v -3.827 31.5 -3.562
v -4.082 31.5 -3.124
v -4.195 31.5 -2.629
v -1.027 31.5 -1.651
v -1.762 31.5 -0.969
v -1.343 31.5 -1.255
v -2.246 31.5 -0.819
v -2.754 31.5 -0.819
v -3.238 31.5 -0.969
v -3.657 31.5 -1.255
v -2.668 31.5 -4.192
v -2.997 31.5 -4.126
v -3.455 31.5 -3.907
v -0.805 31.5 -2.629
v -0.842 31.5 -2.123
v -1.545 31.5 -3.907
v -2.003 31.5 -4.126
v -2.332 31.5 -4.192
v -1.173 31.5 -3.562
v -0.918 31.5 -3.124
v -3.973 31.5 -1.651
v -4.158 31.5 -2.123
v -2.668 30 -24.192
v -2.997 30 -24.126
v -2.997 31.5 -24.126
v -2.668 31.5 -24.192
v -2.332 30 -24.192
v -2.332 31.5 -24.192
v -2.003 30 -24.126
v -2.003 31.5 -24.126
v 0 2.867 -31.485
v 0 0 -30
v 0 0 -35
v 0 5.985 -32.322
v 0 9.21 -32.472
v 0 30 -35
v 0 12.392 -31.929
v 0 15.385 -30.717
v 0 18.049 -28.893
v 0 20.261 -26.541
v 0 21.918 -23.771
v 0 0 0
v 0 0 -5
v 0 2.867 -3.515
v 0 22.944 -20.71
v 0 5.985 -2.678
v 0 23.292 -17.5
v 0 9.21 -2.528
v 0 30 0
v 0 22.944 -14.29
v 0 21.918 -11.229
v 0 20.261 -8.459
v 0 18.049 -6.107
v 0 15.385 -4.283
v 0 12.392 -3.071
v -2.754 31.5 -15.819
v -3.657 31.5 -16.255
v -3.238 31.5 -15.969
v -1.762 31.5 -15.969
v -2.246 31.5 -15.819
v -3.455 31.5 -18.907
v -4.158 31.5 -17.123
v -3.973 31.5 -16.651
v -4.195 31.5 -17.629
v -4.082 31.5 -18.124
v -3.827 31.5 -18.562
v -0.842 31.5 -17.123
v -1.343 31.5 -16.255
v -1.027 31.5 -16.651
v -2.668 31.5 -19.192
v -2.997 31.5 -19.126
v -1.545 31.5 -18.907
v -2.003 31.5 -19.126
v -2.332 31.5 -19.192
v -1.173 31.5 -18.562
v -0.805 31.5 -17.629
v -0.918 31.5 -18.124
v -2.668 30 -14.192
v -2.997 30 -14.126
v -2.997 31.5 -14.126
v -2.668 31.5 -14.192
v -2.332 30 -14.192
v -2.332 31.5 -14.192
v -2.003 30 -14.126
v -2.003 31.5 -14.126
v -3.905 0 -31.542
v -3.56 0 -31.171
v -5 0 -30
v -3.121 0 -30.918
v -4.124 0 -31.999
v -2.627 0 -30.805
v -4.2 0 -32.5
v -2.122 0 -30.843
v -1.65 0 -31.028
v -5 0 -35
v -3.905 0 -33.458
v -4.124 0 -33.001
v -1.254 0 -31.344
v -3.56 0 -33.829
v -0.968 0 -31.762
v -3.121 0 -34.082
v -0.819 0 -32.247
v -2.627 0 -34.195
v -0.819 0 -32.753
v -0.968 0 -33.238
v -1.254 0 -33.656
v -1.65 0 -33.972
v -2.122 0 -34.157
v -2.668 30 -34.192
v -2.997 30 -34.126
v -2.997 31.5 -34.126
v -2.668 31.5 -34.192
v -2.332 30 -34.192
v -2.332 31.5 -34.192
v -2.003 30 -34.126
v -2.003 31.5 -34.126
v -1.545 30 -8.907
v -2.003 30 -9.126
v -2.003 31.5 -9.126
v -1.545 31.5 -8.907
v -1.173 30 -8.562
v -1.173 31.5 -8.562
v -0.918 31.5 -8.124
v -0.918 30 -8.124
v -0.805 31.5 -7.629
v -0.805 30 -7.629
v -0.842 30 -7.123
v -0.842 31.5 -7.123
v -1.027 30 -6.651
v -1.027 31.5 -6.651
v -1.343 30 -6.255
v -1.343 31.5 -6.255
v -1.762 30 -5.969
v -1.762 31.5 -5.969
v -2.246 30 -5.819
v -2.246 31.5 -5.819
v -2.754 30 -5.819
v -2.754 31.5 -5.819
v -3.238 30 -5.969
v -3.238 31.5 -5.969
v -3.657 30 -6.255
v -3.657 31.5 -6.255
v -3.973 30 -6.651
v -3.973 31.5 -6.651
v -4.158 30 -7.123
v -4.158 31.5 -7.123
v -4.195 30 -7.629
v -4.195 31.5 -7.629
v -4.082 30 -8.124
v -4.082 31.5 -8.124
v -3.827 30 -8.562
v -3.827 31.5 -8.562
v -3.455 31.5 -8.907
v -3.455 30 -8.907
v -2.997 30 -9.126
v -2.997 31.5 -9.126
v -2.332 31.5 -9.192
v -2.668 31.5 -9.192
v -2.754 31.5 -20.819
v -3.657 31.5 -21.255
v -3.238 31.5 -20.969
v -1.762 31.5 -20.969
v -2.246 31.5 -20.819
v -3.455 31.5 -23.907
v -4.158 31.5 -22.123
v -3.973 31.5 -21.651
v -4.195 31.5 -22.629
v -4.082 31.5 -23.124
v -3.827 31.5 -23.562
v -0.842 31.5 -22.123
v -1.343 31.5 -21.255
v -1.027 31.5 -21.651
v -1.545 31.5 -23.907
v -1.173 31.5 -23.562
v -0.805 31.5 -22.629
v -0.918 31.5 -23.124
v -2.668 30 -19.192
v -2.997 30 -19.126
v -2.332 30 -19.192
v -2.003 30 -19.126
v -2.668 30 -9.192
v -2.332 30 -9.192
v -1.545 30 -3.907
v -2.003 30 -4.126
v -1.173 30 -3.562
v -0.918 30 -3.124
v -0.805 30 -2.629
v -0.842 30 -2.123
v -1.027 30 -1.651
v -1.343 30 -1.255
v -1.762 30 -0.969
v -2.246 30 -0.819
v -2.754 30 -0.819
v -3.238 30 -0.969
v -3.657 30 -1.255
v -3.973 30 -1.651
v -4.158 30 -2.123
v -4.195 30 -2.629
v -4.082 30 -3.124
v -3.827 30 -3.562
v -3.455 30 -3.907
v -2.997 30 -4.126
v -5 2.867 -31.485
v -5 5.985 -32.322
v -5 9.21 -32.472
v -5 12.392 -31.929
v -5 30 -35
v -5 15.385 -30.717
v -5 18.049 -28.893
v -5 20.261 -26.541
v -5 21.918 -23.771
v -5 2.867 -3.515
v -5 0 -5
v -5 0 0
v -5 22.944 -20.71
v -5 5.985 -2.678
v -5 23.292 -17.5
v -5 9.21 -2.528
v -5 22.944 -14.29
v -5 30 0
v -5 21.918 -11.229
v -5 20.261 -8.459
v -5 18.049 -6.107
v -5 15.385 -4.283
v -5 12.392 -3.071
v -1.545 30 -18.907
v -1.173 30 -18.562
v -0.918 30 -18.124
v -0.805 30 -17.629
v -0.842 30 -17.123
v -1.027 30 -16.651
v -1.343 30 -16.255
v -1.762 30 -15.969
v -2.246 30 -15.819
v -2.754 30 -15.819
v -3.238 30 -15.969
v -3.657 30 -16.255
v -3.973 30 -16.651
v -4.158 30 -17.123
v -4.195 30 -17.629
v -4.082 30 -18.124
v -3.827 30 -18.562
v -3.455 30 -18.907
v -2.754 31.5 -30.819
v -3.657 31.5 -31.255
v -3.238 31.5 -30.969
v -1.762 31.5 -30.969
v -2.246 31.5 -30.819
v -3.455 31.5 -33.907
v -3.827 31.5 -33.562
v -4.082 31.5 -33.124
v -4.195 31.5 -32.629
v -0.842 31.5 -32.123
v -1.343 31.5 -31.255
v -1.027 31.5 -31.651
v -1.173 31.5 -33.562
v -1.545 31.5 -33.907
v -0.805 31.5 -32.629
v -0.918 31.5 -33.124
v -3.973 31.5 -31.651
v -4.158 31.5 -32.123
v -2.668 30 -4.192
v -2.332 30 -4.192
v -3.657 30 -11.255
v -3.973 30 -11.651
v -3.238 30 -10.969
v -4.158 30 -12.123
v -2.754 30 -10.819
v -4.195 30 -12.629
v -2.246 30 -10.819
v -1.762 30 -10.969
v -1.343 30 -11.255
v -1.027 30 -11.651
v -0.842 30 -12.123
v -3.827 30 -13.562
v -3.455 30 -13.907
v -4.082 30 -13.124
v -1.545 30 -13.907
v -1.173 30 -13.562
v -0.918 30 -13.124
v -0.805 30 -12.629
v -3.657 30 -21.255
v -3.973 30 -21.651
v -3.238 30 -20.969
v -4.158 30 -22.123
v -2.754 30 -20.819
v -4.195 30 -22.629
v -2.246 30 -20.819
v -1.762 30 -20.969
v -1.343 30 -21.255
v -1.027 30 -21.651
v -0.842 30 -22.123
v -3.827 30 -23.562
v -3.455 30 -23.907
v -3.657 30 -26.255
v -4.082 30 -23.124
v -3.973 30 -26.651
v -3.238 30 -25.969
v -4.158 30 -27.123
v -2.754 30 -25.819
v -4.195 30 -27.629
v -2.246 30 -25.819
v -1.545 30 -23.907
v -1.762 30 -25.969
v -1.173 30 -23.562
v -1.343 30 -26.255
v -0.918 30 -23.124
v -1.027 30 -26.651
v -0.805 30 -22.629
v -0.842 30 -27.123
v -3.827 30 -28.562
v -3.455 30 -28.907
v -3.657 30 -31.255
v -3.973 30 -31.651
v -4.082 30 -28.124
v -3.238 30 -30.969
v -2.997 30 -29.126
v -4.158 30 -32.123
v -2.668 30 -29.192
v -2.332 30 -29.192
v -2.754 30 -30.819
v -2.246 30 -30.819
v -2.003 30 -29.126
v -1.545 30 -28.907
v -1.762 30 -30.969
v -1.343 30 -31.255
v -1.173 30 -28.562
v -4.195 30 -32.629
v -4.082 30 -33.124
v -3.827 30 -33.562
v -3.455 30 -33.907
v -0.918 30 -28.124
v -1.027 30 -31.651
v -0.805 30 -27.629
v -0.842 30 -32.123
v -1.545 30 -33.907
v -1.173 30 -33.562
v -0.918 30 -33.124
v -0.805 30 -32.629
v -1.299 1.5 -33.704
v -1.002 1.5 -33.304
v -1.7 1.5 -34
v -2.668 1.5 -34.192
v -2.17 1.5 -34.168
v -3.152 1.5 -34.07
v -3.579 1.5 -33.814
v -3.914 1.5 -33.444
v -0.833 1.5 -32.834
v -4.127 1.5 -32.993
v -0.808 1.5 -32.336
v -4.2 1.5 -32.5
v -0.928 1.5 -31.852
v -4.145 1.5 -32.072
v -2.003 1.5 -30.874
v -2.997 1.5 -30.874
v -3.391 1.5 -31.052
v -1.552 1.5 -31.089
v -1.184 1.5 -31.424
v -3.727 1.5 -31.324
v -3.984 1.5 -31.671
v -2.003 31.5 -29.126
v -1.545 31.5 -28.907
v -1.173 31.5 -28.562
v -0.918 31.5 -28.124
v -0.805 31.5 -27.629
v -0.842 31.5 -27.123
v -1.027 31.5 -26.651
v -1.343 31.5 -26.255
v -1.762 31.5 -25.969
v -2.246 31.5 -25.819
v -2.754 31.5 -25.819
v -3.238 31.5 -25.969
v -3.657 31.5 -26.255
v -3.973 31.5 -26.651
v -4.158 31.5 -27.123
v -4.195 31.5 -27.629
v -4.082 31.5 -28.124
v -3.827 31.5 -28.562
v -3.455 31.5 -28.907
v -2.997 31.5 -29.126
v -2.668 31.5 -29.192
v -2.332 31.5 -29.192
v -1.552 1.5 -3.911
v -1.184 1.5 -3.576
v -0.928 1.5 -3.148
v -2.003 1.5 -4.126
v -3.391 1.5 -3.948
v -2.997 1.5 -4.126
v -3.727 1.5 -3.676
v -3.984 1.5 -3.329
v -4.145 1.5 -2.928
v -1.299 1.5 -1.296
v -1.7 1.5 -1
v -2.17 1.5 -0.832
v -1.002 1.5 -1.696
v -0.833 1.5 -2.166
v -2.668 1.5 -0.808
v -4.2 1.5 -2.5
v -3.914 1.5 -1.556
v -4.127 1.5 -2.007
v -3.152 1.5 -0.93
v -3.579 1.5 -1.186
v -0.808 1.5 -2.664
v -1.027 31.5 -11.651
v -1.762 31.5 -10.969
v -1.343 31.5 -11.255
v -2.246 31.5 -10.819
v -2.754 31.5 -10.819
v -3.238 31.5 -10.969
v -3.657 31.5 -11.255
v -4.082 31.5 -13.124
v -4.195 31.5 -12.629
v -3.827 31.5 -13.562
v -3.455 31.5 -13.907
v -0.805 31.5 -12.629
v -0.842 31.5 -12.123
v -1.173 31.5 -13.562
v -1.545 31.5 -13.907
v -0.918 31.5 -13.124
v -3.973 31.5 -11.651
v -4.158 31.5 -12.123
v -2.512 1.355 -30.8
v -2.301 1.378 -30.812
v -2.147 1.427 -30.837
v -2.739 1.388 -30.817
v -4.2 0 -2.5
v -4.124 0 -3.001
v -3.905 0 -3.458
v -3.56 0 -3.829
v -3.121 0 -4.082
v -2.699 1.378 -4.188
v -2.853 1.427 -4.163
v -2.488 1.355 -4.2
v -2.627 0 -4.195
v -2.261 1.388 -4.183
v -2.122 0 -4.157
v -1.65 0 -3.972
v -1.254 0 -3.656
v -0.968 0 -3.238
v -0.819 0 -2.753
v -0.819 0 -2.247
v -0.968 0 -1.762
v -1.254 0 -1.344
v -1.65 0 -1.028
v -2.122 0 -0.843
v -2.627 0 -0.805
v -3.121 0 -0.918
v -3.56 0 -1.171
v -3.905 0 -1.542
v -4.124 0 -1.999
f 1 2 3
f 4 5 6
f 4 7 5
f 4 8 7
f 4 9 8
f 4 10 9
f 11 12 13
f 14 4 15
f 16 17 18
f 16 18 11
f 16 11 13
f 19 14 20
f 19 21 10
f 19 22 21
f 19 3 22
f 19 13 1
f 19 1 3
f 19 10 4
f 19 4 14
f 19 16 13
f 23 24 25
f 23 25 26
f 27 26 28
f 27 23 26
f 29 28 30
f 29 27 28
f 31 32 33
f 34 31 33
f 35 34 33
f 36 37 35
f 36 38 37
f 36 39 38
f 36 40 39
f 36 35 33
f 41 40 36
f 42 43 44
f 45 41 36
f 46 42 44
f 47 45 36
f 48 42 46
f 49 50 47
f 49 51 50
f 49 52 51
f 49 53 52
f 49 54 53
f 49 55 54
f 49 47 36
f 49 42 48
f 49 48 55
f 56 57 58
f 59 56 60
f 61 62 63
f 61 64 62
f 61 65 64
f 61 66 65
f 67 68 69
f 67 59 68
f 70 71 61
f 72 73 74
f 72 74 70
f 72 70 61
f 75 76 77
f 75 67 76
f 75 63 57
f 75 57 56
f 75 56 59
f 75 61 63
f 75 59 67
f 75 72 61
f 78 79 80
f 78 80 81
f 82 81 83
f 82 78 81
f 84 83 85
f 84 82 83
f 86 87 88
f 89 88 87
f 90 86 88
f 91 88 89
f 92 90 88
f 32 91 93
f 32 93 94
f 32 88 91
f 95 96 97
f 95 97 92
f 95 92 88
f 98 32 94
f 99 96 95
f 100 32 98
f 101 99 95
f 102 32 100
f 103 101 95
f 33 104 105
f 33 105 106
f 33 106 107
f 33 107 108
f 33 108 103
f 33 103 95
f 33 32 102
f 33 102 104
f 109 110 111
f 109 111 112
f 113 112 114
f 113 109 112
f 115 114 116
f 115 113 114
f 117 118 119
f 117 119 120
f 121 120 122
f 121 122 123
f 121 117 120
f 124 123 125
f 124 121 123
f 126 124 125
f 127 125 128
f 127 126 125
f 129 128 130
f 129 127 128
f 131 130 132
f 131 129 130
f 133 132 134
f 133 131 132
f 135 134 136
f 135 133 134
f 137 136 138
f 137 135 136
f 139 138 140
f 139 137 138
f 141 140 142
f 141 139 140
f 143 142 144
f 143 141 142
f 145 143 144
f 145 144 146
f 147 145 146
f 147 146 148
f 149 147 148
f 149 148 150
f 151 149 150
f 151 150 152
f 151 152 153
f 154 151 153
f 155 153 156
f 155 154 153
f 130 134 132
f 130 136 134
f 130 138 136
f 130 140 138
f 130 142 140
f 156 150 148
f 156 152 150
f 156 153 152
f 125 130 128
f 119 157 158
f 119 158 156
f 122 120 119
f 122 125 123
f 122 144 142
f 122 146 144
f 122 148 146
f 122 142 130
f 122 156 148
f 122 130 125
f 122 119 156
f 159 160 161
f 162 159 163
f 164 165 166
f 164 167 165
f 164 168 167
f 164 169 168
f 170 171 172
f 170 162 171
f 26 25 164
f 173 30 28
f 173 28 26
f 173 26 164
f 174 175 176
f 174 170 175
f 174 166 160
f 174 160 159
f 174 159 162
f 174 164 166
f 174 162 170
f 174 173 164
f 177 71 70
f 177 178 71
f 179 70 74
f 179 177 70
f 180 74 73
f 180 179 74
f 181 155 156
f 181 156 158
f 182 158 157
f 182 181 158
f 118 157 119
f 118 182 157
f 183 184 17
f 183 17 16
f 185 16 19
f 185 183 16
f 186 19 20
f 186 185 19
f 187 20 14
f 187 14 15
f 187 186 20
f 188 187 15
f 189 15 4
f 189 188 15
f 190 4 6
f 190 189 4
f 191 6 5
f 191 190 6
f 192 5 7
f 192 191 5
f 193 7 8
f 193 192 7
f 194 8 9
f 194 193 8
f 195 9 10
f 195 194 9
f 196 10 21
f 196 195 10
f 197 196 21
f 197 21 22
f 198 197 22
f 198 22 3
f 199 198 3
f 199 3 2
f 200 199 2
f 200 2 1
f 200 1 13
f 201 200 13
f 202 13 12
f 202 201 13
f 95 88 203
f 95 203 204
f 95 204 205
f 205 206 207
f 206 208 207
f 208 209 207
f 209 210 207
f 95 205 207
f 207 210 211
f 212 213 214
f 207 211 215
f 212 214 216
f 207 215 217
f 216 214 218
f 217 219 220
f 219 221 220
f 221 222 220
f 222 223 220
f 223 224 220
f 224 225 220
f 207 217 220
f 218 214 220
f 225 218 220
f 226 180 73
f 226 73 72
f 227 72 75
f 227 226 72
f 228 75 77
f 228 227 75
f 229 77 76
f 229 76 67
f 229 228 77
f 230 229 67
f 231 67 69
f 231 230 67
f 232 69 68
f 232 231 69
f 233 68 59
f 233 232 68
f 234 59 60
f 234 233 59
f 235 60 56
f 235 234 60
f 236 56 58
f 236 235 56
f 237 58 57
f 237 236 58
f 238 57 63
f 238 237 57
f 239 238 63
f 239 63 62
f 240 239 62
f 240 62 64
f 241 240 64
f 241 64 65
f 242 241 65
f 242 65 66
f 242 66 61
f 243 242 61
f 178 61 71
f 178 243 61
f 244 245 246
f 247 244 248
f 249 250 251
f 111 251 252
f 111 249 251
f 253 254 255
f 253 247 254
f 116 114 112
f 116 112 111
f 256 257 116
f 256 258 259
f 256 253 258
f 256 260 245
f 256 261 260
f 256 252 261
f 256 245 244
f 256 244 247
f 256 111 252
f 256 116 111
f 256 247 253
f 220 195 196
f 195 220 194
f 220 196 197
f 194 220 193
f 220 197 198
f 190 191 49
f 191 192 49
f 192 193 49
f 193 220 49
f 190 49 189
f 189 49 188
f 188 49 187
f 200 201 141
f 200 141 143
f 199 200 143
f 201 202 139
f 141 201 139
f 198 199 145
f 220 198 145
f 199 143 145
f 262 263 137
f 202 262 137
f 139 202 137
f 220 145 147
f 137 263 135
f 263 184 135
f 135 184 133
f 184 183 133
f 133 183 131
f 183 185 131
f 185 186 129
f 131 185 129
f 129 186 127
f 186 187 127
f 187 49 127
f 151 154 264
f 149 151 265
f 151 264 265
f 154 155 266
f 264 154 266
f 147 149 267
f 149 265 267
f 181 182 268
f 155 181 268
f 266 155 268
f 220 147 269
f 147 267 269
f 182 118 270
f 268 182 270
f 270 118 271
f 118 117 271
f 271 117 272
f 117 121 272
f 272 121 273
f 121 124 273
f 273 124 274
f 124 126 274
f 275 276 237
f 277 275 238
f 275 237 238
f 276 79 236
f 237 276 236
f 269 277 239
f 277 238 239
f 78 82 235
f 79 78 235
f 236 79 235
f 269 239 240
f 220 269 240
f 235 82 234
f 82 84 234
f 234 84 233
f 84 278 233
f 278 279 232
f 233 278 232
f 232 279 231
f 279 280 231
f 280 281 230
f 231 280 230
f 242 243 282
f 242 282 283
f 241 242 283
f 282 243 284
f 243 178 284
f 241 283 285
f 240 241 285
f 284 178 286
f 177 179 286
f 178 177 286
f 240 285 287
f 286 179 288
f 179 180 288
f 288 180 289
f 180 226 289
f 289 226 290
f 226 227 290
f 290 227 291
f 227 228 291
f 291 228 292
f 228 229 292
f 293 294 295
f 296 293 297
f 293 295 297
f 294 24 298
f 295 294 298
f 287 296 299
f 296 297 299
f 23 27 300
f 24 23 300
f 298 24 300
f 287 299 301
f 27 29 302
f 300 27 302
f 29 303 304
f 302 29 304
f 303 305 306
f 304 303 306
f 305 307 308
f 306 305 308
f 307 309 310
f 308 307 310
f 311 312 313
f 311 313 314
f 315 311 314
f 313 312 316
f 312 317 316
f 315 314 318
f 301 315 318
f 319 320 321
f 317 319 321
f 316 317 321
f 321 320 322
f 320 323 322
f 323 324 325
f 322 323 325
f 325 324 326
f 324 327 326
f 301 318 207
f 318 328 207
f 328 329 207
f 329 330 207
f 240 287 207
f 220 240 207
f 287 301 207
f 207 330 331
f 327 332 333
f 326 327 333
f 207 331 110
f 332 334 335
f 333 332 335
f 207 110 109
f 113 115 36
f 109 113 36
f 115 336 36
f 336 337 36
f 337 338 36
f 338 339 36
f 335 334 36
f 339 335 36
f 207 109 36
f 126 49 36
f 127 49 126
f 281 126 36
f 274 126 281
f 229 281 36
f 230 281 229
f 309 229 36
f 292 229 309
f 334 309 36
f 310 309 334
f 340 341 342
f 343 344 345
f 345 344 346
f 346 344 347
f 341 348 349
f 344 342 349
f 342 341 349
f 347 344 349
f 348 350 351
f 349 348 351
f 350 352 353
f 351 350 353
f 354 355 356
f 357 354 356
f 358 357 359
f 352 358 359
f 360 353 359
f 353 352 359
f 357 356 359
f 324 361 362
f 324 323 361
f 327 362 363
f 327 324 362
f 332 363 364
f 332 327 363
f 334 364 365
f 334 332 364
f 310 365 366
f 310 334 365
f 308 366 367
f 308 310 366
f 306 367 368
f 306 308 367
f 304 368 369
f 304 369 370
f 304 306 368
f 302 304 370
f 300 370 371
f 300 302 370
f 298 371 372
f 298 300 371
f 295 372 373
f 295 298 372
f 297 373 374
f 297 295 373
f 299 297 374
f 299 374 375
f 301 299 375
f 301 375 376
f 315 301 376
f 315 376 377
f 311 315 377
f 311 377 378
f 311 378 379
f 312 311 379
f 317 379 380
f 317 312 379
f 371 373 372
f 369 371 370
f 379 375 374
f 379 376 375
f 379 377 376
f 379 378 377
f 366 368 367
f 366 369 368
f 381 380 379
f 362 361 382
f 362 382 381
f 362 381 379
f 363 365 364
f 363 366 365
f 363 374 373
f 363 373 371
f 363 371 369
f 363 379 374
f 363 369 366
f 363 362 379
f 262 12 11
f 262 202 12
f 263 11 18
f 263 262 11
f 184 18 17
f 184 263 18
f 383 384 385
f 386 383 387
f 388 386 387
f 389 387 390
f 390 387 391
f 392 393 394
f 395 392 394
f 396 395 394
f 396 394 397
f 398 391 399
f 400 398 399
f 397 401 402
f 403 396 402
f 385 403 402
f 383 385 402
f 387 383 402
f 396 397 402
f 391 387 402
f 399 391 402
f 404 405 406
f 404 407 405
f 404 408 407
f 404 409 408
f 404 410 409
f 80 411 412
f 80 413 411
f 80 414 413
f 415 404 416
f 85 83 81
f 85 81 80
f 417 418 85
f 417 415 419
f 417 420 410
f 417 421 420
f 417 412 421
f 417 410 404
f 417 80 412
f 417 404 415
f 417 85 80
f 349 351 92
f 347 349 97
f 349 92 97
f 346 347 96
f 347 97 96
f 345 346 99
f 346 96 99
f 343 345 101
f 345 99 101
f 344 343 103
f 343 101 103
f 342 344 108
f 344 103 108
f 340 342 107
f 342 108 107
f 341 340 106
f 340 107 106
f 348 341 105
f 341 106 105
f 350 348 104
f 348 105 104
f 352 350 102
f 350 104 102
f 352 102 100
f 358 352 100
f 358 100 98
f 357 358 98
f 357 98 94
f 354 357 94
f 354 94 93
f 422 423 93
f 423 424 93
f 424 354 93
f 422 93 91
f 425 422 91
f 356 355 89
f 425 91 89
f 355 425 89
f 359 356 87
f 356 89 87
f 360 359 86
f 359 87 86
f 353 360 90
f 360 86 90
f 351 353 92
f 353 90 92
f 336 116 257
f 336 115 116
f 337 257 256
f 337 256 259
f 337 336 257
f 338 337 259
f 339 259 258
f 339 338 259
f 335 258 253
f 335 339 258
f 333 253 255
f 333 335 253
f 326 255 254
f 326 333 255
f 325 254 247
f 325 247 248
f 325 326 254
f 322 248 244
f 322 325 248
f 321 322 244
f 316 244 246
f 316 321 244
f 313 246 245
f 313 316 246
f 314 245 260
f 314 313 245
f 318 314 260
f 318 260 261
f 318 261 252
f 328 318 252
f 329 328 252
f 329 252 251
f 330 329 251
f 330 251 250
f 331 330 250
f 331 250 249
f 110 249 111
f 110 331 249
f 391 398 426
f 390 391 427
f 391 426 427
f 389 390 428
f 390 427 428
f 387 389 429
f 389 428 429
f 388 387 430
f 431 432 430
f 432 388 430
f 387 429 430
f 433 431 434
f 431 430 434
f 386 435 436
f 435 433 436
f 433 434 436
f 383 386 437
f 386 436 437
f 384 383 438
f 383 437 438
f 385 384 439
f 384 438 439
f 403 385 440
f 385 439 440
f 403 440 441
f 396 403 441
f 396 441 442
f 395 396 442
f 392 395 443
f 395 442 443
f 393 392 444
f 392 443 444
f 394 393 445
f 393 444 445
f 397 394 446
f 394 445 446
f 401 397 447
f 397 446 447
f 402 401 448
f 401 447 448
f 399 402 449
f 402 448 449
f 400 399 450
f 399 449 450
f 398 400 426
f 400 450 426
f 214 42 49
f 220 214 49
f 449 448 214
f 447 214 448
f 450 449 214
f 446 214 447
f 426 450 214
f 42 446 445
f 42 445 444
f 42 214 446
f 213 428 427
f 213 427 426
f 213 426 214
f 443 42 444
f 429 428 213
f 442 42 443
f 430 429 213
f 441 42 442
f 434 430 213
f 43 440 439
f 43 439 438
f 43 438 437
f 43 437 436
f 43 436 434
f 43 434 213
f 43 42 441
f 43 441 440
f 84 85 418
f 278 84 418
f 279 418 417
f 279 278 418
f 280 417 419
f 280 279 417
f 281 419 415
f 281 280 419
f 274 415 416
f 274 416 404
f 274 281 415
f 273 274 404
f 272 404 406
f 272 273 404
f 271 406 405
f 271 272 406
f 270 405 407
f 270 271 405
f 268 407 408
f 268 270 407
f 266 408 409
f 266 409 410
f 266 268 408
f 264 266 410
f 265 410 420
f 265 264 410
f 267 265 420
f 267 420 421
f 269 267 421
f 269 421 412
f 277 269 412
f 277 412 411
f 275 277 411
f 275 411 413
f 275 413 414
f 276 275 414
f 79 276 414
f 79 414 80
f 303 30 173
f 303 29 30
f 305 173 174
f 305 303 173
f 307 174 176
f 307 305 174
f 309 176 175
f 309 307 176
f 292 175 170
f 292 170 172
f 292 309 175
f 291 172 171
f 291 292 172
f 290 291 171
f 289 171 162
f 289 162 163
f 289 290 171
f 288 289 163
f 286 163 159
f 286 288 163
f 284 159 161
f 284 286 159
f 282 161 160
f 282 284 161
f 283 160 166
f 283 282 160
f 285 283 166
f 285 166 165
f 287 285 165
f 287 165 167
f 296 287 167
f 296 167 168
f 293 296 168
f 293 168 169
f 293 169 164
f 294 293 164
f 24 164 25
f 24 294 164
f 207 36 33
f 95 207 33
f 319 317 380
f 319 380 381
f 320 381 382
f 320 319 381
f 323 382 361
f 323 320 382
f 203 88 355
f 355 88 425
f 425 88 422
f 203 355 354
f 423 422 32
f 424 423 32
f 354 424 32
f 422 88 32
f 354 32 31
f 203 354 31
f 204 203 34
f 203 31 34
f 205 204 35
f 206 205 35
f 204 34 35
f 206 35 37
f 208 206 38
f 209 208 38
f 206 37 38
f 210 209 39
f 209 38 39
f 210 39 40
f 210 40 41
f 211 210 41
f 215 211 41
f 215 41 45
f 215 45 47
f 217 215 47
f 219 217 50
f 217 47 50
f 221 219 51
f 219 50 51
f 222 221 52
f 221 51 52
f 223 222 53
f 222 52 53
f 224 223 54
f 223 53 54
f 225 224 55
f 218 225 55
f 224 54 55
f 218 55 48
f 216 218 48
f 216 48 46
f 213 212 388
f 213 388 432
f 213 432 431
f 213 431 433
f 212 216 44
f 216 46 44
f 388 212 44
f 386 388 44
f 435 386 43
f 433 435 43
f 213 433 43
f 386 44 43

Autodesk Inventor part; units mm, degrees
ref_plane "YZ Plane" through (0, 0, 0) normal (1, 0, 0) x (0, 1, 0)
ref_plane "XZ Plane" through (0, 0, 0) normal (0, 1, 0) x (-1, 0, 0)
ref_plane "XY Plane" through (0, 0, 0) normal (0, 0, 1) x (1, 0, 0)
sketch "草圖1" plane through (0, 0, 0) normal (0, 1, 0) x (-1, 0, 0)
  line L0 (5, 0) -> (0, 0)
  line L1 (0, 0) -> (0, -35)
  line L2 (0, -35) -> (5, -35)
  line L3 (5, -35) -> (5, 0)
  circle A0 centre (2.5, -2.5) radius 1.7
  circle A1 centre (2.5, -7.5) radius 1.7
  circle A2 centre (2.5, -12.5) radius 1.7
  circle A3 centre (2.5, -17.5) radius 1.7
  circle A4 centre (2.5, -22.5) radius 1.7
  circle A5 centre (2.5, -27.5) radius 1.7
  circle A6 centre (2.5, -32.5) radius 1.7
  line L4 (5, -5) -> (0, -5)
  line L5 (5, -30) -> (0, -30)
  dimension "d0" = 5
  dimension "d1" = 35
  dimension "d2" = 3.4
  dimension "d3" = 2.5
  dimension "d4" = 2.5
  dimension "d7" = 5
  dimension "d12" = 5
  dimension "d13" = 5
sketch "草圖2" plane through (0, 0, 0) normal (1, 0, 0) x (0, 1, 0)
  line L0 (0, 0) -> (0, -35) projected
  line L1 (0, 0) -> (30, 0)
  line L2 (30, 0) -> (30, -35)
  line L3 (30, -35) -> (0, -35)
  arc A0 (0, -30) -> (0, -5) centre (8.2916, -17.5) ccw
  point P0 (0, -5)
  dimension "d15" = 30
  dimension "d25" = 15
extrude "擠出1" add sketch "草圖2" against normal blind 5 contours L1 L2 L3 L0 A0
extrude "擠出2" cut sketch "草圖1" along normal blind 1.5 contours A0 | A6
sketch "草圖3" plane through (0, 30, 0) normal (0, 1, 0) x (1, 0, 0)
  arc A0 (-2.9974, 4.1256) -> (-2.0026, 4.1256) centre (-2.5, 2.5) ccw projected
  circle A1 centre (-2.5, 2.5) radius 1.7
  point P0 (0, 0)
  point P1 (-2.9974, 4.1256)
extrude "擠出4" add sketch "草圖3" along normal blind 1.5
pattern_linear "矩形陣列2" count 7 spacing 5 along (0, 0, -1) of "擠出4"
properties part number "110033226_ipt_22_塔樓門口"
